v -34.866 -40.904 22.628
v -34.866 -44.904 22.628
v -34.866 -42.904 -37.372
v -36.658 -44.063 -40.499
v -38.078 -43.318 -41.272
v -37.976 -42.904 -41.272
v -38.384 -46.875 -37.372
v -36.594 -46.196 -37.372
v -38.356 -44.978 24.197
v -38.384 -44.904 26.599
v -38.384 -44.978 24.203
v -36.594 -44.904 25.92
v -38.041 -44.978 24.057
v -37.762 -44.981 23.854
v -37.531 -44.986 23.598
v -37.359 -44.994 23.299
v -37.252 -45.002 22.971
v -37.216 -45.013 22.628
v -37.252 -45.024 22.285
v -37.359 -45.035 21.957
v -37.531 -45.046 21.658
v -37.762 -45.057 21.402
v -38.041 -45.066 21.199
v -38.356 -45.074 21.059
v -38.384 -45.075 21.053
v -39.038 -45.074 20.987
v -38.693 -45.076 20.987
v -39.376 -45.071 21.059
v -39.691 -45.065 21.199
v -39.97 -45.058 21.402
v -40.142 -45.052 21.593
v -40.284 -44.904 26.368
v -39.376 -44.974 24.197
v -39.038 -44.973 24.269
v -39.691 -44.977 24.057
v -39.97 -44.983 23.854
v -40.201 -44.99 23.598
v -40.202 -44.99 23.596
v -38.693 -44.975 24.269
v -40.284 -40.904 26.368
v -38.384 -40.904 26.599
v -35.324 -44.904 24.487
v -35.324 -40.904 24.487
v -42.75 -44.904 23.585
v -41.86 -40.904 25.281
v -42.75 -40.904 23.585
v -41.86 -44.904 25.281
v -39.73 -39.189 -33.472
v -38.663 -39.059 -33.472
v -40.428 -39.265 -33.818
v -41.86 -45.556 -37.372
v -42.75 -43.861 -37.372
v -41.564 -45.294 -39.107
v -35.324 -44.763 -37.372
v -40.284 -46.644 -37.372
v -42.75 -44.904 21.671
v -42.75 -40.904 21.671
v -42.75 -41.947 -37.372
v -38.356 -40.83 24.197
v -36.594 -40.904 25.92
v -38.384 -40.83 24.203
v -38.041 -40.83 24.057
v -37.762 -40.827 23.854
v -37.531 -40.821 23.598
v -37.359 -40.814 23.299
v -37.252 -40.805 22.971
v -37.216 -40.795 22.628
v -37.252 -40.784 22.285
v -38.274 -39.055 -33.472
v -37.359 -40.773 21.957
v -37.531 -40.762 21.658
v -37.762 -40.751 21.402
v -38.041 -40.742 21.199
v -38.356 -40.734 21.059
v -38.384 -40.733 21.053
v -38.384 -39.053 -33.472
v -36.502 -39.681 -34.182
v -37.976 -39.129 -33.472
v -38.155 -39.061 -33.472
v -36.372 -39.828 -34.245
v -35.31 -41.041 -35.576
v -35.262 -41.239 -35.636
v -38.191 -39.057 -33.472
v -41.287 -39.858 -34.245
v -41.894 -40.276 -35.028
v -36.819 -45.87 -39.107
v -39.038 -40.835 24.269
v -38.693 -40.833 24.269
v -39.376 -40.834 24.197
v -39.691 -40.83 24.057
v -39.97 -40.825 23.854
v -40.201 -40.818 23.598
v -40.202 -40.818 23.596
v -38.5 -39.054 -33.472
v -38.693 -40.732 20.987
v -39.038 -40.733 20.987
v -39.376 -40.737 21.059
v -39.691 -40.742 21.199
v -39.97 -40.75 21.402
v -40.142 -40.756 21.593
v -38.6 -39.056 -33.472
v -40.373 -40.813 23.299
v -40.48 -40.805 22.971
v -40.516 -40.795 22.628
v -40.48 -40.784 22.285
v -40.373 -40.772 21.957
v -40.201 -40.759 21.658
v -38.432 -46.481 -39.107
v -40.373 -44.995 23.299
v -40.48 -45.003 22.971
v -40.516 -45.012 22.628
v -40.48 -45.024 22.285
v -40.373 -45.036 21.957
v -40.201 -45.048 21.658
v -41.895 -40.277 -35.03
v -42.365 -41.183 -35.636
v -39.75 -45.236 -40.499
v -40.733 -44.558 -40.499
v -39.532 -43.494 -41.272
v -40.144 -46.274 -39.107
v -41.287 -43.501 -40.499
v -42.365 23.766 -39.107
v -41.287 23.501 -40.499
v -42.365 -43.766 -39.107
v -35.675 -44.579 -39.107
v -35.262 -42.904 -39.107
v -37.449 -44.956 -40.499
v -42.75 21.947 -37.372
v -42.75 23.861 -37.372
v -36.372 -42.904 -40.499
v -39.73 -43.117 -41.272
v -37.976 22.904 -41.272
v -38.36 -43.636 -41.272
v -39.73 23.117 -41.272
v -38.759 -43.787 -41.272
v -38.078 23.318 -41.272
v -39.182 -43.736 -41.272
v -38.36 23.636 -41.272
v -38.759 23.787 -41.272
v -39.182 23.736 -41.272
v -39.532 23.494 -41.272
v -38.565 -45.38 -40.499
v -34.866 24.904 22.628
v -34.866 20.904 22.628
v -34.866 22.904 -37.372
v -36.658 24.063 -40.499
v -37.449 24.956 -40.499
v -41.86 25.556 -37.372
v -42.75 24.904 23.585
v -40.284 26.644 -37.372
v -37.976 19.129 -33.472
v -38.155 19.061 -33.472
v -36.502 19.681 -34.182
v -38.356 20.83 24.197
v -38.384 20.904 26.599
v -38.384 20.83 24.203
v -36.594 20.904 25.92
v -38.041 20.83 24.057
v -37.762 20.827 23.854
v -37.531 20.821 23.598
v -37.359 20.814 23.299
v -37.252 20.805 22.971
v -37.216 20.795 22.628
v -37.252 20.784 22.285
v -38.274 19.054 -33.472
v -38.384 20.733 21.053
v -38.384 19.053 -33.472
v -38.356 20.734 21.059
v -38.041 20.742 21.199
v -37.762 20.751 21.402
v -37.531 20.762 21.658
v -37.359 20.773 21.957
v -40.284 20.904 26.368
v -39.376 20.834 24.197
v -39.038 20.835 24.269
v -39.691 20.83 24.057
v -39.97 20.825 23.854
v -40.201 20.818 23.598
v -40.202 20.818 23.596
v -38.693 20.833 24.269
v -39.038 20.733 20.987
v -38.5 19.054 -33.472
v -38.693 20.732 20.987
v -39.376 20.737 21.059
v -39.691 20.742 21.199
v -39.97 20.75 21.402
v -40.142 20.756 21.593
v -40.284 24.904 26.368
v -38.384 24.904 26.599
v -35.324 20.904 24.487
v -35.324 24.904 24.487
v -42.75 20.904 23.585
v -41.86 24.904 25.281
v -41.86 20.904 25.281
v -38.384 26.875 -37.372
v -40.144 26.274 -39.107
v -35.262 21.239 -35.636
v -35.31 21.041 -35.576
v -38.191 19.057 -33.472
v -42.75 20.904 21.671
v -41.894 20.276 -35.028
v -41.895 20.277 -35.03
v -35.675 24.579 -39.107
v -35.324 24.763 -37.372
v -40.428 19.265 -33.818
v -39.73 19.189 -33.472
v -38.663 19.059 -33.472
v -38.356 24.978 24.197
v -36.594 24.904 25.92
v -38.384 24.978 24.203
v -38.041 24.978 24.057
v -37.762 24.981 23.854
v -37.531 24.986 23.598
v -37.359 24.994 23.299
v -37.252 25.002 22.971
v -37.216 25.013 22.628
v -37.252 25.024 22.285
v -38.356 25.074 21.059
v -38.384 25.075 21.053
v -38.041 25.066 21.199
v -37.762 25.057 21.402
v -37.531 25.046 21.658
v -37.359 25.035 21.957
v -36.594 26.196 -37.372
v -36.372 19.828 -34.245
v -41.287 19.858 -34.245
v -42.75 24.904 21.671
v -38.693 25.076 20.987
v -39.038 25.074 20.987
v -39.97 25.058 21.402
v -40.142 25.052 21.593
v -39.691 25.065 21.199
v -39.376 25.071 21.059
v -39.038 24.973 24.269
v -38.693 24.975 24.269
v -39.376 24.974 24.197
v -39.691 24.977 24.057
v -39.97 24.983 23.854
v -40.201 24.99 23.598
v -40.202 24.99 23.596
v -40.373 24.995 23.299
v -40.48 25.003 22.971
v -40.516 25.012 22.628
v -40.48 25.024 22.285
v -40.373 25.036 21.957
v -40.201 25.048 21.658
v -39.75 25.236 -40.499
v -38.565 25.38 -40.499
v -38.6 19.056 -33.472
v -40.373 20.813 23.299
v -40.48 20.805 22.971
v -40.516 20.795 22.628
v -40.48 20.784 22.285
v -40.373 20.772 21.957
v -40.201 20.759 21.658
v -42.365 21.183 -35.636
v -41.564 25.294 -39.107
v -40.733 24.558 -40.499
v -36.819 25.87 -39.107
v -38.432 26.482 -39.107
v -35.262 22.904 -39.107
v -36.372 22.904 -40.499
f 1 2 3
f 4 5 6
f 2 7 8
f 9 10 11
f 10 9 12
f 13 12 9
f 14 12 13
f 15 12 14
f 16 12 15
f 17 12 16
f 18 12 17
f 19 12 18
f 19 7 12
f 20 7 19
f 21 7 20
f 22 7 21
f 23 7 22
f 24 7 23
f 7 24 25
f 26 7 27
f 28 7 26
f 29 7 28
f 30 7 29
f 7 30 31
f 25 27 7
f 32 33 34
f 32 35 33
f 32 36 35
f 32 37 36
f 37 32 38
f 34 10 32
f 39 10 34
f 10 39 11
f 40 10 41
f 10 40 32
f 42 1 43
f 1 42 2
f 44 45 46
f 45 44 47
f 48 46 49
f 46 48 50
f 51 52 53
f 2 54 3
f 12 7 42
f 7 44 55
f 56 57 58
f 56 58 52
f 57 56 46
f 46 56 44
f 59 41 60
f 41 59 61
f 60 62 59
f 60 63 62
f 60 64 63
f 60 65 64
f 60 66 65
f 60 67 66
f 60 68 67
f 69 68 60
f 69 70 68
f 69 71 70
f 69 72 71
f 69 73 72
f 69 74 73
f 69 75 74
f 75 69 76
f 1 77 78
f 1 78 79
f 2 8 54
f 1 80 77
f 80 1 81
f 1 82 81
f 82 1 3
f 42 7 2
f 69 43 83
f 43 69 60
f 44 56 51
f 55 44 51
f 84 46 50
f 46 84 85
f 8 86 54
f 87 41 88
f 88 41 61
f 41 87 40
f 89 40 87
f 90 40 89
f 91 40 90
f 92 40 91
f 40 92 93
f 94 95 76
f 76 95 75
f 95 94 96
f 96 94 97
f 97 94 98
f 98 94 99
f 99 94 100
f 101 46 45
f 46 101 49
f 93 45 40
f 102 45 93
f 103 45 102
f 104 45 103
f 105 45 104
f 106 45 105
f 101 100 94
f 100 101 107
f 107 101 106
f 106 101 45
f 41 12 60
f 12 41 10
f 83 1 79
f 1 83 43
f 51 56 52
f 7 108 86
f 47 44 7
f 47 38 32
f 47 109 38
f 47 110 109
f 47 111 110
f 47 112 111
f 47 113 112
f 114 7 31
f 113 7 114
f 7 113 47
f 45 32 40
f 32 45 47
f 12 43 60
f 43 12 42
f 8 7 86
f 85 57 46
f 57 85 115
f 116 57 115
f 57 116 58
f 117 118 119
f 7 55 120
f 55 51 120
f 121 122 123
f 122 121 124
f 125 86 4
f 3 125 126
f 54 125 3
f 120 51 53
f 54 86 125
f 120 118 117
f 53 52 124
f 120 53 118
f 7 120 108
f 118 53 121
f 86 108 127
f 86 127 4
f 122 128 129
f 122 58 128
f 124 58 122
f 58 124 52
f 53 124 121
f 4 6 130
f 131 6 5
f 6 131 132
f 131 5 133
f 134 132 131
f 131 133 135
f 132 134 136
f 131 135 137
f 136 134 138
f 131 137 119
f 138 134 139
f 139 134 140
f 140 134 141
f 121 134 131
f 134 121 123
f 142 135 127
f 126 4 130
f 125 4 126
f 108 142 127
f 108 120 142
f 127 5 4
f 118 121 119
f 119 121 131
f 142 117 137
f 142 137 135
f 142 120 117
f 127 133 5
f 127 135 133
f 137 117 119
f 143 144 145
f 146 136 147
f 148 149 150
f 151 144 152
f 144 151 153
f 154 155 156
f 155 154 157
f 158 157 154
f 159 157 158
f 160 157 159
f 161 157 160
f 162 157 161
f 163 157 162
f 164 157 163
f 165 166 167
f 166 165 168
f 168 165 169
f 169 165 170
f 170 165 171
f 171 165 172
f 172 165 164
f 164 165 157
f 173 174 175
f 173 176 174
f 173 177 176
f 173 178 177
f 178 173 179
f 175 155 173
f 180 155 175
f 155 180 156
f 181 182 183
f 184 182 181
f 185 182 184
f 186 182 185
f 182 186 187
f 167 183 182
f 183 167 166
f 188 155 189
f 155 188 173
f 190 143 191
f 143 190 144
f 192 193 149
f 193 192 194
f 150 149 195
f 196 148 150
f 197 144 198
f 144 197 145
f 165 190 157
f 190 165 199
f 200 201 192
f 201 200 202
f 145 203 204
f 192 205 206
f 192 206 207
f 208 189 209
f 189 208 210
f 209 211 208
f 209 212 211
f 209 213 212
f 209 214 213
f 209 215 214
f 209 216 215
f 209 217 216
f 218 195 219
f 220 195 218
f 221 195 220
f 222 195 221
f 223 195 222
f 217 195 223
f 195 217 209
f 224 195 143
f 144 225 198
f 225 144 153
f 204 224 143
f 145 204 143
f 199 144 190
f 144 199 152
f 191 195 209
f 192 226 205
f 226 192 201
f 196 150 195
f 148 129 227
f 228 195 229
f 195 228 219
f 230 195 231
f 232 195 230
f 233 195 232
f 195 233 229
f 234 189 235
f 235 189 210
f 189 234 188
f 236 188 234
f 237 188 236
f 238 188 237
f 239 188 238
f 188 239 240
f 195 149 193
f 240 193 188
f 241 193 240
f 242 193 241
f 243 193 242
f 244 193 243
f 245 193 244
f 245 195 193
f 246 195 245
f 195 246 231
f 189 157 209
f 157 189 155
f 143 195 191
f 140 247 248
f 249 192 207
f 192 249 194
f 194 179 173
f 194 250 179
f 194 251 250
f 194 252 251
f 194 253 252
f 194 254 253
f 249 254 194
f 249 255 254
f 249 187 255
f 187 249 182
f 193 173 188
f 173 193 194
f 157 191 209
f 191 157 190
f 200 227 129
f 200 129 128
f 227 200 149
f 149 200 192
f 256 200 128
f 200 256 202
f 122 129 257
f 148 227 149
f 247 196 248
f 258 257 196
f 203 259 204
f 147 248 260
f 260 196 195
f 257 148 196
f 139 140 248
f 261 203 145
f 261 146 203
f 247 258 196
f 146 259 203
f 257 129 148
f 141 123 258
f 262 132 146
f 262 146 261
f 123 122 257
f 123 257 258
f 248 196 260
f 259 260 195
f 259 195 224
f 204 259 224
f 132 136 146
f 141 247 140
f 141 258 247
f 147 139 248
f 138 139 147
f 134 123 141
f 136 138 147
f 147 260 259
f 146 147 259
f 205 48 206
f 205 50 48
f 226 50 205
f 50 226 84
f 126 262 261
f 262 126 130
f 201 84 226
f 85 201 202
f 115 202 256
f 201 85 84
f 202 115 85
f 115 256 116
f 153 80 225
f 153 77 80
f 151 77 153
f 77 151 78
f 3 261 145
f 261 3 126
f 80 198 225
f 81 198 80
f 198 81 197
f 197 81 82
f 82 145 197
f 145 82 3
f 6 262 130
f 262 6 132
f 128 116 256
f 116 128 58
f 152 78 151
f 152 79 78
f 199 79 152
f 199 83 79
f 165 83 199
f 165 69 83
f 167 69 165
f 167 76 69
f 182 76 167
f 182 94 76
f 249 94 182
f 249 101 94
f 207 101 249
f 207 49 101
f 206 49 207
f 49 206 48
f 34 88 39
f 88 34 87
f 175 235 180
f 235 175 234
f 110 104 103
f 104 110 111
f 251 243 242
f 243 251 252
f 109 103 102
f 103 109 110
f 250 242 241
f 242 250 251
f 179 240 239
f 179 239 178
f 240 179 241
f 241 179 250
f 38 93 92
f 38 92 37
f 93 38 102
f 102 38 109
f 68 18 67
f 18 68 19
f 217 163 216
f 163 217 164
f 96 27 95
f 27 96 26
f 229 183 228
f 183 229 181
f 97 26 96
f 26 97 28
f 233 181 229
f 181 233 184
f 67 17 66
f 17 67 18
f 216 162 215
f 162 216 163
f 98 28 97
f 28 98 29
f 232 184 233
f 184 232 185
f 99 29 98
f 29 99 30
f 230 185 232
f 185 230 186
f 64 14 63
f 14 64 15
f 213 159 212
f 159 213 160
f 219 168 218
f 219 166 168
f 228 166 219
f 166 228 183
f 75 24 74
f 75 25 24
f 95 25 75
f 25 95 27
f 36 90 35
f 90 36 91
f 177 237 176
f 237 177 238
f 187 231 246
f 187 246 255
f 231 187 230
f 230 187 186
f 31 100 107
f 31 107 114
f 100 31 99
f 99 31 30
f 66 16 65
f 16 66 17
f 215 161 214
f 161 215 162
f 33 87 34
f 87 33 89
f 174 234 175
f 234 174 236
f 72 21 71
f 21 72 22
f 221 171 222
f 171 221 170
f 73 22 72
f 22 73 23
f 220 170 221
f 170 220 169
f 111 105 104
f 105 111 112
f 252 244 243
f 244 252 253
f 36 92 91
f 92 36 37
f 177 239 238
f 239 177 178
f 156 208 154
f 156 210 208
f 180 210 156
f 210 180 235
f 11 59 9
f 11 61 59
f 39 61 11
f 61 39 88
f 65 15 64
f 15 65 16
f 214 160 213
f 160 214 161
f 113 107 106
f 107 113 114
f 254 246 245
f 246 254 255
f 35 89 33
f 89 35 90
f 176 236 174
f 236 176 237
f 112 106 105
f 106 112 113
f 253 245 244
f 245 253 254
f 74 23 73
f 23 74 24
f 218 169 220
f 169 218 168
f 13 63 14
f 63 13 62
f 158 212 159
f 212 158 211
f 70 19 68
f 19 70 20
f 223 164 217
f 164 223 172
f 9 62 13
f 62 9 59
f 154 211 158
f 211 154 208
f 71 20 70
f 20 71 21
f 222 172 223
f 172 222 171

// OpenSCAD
difference () {
  union () {
    hull () {
      translate ([0, 8, 0]) {
        translate ([-38.86596295863632, -50.90390227202768, 22.628112637472807]) {
          rotate (a=90.0, v=[1, 0, 0]) {
            cylinder (h=4, r=4, center=true);
          }
        }
      }
      translate ([0, 8, -60]) {
        translate ([-38.86596295863632, -50.90390227202768, 22.628112637472807]) {
          sphere (r=4);
        }
      }
    }
    hull () {
      translate ([0, -4, 0]) {
        translate ([-38.86596295863632, 26.90390227202768, 22.628112637472807]) {
          rotate (a=90.0, v=[1, 0, 0]) {
            cylinder (h=4, r=4, center=true);
          }
        }
      }
      translate ([0, -4, -60]) {
        translate ([-38.86596295863632, 26.90390227202768, 22.628112637472807]) {
          sphere (r=4);
        }
      }
    }
    hull () {
      translate ([0, 8, -60]) {
        translate ([-38.86596295863632, -50.90390227202768, 22.628112637472807]) {
          sphere (r=4);
        }
      }
      translate ([0, -4, -60]) {
        translate ([-38.86596295863632, 26.90390227202768, 22.628112637472807]) {
          sphere (r=4);
        }
      }
    }
  }
  hull () {
    translate ([-38.86596295863632, 26.90390227202768, 22.628112637472807]) {
      rotate (a=90.0, v=[1, 0, 0]) {
        cylinder ($fn=30, h=20, r=1.65, center=true);
      }
    }
    translate ([-38.86596295863632, -50.90390227202768, 22.628112637472807]) {
      rotate (a=90.0, v=[1, 0, 0]) {
        cylinder ($fn=30, h=20, r=1.65, center=true);
      }
    }
  }
}
